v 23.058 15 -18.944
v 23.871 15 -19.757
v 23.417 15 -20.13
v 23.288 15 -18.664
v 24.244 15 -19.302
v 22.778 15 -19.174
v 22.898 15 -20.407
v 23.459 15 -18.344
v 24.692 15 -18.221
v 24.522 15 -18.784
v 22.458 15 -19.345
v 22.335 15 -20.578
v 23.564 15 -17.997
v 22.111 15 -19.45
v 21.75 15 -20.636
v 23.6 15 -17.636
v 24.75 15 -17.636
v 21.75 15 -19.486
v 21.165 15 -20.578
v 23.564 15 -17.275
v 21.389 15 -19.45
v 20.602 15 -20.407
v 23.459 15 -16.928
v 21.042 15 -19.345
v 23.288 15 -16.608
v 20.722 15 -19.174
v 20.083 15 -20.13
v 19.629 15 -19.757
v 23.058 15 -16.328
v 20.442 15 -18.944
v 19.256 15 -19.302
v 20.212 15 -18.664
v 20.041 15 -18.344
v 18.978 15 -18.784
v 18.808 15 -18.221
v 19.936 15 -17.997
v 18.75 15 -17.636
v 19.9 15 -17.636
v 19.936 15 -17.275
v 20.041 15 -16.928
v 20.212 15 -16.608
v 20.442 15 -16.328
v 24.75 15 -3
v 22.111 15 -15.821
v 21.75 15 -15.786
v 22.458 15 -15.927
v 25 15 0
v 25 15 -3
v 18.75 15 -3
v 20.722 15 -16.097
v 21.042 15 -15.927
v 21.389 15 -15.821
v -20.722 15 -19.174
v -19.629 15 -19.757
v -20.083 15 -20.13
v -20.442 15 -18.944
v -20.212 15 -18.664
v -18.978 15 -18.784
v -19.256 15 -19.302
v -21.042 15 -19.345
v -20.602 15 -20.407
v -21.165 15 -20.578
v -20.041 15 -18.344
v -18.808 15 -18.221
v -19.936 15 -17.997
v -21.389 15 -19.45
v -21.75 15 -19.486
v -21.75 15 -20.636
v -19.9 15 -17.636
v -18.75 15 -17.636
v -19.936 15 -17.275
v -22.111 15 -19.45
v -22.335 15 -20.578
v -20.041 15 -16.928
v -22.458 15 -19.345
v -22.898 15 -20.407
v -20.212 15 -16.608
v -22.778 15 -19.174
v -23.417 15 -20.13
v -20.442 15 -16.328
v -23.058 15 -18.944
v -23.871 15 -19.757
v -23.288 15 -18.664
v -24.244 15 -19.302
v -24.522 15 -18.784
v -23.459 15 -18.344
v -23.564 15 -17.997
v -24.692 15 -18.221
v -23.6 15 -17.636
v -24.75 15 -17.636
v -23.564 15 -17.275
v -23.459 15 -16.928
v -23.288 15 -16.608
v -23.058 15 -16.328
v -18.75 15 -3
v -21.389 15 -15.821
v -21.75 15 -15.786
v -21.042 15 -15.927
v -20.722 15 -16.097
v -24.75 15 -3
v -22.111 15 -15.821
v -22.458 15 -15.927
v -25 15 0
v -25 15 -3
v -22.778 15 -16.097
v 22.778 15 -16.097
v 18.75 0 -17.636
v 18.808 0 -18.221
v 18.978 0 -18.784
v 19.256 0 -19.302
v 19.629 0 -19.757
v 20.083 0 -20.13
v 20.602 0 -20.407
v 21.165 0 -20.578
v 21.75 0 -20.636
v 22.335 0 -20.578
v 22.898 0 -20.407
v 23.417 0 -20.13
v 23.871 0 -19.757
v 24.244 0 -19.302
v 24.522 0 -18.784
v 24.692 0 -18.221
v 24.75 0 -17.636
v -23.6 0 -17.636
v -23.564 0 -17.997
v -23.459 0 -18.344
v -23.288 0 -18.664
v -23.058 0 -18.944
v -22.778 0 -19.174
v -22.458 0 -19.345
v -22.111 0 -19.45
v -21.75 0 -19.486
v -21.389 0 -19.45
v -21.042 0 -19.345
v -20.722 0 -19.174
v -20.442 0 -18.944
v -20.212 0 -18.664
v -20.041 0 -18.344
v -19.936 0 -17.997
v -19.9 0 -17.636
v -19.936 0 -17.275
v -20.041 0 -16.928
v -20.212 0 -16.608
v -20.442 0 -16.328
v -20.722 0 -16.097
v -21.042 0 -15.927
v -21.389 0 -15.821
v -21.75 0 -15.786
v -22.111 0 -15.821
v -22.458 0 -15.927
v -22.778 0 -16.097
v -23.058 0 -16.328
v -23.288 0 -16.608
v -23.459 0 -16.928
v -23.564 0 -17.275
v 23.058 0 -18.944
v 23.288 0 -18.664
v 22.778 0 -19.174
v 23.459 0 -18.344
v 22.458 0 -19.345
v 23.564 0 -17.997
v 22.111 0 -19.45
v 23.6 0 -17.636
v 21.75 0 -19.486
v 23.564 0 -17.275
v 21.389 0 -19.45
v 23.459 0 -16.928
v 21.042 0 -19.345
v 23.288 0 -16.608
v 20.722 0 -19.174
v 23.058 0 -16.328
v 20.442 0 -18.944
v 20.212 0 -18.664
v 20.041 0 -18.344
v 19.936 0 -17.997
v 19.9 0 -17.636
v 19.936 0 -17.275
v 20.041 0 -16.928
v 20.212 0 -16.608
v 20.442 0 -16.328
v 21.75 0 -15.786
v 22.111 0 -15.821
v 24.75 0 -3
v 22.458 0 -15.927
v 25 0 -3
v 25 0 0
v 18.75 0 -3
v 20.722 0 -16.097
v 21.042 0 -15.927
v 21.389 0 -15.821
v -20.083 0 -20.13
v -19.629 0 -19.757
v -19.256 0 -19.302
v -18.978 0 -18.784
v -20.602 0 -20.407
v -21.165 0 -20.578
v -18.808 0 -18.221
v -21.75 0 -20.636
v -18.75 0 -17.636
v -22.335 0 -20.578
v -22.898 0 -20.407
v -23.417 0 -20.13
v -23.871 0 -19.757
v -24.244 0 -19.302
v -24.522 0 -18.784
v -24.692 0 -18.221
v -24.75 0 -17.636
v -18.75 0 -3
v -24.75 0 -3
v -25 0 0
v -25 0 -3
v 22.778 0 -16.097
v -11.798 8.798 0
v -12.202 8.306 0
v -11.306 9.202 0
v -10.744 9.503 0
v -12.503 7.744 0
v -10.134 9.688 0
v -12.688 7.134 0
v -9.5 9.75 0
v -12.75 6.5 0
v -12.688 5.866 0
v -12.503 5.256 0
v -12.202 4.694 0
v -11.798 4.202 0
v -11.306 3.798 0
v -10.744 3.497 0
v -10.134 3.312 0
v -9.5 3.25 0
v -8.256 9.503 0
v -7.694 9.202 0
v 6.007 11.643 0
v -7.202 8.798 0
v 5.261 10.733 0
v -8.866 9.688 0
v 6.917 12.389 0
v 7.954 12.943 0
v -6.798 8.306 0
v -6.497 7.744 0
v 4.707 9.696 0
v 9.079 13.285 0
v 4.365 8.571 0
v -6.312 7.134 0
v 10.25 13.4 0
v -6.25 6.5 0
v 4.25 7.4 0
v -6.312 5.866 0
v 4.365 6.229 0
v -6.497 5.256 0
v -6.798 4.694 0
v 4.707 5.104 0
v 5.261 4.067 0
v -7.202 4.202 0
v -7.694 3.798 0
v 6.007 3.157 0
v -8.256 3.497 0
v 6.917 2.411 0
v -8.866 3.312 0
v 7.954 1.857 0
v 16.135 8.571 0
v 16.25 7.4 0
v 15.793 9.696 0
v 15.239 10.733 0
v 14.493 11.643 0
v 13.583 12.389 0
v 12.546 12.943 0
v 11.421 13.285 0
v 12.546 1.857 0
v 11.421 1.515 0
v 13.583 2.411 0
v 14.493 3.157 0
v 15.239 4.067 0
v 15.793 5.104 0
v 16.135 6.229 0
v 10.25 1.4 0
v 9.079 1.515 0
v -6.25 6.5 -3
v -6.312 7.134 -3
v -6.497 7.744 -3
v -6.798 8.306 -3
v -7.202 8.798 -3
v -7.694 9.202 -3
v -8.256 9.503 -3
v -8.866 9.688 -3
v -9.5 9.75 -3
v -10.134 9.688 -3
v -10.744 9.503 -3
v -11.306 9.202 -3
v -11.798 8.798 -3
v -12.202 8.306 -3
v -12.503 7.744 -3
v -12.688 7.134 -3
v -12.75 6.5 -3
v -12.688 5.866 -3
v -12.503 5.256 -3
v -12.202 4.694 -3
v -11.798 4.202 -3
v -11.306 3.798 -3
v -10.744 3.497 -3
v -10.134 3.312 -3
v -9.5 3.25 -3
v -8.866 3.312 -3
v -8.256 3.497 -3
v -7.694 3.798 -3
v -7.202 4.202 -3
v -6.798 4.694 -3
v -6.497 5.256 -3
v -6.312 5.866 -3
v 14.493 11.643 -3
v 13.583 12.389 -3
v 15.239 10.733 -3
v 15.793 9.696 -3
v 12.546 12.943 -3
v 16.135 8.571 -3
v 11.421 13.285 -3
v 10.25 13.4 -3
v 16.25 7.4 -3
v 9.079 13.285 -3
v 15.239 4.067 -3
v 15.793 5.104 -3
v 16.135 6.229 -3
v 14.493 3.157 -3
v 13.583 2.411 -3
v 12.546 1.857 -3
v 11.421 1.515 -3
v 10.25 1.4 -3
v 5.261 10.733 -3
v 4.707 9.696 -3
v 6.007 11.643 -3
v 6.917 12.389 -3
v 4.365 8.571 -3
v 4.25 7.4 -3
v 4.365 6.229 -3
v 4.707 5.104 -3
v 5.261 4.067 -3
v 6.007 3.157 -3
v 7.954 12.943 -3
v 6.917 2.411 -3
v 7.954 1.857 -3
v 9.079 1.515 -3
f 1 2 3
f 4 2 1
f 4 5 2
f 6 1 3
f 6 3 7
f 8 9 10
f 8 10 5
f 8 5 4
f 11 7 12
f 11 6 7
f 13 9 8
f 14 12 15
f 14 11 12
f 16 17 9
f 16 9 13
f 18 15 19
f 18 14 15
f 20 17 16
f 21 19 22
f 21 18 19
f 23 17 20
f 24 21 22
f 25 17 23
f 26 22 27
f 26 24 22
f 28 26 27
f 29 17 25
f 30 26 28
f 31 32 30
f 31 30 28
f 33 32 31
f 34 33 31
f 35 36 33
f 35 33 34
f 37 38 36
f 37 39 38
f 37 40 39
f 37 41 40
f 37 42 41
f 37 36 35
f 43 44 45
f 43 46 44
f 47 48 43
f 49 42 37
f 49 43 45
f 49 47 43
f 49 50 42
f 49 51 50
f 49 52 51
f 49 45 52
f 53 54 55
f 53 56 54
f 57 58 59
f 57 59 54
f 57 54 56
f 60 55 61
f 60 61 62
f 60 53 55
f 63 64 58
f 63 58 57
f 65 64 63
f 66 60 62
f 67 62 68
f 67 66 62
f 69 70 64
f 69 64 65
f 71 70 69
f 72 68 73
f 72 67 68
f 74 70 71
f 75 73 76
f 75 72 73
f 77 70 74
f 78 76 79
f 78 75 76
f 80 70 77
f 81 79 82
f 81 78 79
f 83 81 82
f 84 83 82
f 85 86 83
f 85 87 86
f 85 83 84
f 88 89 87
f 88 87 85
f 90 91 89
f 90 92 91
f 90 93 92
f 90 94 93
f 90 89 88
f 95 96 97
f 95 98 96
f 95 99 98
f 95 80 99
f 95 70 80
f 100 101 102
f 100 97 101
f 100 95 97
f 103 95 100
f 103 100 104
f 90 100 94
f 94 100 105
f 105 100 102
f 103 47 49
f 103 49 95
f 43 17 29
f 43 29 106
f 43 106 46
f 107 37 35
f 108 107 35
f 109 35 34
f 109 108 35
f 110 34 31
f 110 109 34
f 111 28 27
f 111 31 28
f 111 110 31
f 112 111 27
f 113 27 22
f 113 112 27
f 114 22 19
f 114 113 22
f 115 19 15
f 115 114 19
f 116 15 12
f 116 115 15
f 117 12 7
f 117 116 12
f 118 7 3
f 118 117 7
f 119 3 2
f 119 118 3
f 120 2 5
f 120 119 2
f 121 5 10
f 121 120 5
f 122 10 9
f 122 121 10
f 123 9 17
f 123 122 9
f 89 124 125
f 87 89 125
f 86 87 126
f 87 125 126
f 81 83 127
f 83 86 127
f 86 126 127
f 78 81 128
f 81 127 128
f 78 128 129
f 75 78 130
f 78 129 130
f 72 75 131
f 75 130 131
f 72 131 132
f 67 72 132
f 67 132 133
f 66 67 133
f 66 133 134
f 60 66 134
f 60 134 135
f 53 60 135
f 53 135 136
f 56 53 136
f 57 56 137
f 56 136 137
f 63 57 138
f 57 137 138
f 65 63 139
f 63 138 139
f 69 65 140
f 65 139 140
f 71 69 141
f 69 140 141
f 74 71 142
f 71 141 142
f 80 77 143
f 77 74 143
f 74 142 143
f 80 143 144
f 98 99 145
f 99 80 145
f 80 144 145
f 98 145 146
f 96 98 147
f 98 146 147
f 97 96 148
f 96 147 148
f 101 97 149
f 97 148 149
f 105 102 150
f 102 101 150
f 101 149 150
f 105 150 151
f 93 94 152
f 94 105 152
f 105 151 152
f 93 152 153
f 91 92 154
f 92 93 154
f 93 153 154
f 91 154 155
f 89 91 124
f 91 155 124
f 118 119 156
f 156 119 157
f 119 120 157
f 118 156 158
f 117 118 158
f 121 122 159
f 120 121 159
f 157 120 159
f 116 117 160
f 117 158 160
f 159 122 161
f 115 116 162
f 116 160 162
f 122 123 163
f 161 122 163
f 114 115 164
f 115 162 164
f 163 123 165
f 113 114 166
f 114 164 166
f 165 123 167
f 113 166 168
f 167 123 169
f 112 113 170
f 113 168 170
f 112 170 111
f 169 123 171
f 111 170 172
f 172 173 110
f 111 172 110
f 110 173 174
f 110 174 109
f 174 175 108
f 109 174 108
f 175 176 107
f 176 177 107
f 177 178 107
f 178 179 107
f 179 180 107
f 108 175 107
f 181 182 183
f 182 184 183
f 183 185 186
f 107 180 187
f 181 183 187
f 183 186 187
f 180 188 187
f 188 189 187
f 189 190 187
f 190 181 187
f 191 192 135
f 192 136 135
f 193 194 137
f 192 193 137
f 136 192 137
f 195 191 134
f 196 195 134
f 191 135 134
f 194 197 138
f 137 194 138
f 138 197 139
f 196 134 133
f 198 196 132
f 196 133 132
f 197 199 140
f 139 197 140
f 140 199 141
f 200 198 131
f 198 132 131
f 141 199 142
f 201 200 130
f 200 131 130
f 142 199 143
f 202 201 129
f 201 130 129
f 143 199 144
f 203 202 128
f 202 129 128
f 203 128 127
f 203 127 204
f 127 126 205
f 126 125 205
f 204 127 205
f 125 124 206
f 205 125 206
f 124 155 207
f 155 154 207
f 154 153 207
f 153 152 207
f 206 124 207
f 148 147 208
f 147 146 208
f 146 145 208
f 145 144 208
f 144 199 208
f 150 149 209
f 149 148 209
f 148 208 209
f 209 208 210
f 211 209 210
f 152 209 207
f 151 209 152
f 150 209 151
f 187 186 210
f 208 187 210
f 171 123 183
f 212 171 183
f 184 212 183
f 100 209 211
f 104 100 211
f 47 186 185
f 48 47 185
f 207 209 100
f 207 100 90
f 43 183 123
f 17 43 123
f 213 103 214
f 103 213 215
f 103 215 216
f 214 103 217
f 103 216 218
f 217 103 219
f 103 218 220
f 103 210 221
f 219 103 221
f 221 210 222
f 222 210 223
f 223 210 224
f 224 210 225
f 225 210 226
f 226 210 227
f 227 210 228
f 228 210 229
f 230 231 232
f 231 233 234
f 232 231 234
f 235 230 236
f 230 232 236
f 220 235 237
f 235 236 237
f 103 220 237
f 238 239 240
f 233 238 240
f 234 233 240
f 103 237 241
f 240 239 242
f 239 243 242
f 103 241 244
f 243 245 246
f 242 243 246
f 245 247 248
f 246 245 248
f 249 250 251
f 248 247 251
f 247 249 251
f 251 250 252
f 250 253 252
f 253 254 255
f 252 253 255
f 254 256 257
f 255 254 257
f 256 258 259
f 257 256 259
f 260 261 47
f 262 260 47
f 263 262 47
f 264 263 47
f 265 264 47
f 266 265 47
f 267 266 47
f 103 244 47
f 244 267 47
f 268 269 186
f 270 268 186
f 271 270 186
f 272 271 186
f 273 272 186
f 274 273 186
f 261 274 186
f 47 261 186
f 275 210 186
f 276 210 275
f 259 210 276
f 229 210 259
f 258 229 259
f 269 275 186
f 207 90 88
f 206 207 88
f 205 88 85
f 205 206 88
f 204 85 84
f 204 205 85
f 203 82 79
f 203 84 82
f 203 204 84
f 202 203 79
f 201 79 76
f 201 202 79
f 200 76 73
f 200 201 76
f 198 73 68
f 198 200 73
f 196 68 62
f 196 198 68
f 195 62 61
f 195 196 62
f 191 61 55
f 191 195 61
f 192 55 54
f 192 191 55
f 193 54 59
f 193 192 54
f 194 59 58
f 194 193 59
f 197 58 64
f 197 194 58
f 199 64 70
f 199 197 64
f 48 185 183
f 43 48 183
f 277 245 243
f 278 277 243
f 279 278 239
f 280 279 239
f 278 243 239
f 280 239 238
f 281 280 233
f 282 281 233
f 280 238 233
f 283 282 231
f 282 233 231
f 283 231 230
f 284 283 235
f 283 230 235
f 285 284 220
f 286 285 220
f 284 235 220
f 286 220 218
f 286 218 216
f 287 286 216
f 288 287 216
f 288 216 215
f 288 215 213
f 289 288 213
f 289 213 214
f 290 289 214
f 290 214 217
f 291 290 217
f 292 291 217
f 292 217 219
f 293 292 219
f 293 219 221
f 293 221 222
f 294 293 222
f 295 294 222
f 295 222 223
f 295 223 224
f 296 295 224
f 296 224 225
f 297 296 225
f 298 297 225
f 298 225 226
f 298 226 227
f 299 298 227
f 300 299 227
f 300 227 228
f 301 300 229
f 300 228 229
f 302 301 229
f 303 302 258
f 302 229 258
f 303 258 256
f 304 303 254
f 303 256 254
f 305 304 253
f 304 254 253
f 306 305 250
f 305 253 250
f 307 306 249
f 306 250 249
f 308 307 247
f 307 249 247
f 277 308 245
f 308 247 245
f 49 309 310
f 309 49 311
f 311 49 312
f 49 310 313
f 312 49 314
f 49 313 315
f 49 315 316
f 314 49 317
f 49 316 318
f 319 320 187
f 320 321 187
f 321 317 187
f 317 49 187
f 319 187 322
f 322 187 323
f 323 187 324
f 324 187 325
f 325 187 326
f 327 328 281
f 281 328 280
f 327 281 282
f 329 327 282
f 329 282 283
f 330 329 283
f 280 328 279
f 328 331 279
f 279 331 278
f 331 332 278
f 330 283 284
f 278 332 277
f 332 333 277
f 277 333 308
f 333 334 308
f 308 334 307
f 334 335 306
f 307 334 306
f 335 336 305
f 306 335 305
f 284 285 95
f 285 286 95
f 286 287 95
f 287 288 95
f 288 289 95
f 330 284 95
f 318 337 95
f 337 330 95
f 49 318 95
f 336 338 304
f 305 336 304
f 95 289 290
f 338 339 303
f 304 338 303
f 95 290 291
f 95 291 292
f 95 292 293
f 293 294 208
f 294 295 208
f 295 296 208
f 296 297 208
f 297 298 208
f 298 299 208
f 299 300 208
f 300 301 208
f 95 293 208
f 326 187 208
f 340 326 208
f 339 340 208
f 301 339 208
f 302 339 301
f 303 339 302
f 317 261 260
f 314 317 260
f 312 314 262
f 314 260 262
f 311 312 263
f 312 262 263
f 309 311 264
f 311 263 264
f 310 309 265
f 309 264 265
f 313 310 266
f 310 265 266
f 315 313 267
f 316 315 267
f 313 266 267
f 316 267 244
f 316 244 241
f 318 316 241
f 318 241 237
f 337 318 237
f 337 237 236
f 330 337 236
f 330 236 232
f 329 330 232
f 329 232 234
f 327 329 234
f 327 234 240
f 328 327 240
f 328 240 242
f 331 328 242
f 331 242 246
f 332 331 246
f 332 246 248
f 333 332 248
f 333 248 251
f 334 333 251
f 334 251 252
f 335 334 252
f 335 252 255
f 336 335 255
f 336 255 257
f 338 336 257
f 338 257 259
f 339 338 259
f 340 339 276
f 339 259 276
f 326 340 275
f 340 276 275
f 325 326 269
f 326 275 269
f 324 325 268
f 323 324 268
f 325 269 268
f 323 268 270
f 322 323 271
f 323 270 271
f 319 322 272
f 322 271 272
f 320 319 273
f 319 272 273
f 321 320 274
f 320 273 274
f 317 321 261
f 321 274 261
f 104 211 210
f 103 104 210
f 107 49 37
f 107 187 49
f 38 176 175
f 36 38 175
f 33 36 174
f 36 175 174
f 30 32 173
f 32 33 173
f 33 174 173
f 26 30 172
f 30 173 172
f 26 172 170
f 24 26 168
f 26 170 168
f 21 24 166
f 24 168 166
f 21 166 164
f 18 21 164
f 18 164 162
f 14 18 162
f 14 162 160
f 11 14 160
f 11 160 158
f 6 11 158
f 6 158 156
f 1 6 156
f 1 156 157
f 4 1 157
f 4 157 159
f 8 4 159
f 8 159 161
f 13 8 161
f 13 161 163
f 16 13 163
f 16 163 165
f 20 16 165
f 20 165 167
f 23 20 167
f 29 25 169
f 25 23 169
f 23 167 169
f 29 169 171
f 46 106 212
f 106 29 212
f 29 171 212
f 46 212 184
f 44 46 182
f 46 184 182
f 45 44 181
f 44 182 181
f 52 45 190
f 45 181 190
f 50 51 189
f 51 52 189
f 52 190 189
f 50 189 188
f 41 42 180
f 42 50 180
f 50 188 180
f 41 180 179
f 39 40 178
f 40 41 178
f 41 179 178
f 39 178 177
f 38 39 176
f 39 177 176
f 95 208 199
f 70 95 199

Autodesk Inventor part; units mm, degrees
ref_plane "YZ Plane" through (0, 0, 0) normal (1, 0, 0) x (0, 1, 0)
ref_plane "XZ Plane" through (0, 0, 0) normal (0, 1, 0) x (-1, 0, 0)
ref_plane "XY Plane" through (0, 0, 0) normal (0, 0, 1) x (1, 0, 0)
sketch "Sketch1" plane through (0, 0, 0) normal (0, 1, 0) x (-1, 0, 0)
  line L0 (25, 0) -> (-25, 0)
  line L1 (-25, 0) -> (-25, -3)
  line L2 (-25, -3) -> (25, -3)
  line L3 (25, -3) -> (25, 0)
  line L4 (0, 0) -> (0, -12.1399) construction
  line L5 (24.75, -3) -> (24.75, -17.6357)
  line L6 (18.75, -3) -> (18.75, -17.6357)
  arc A0 (18.75, -17.6357) -> (24.75, -17.6357) centre (21.75, -17.6357) ccw
  circle A1 centre (21.75, -17.6357) radius 1.85
  line L7 (-24.75, -3) -> (-24.75, -17.6357)
  line L8 (-18.75, -3) -> (-18.75, -17.6357)
  arc A2 (-24.75, -17.6357) -> (-18.75, -17.6357) centre (-21.75, -17.6357) ccw
  circle A3 centre (-21.75, -17.6357) radius 1.85
  line L9 (-24.75, -3) -> (-18.75, -3)
  dimension "d0" = 3
  dimension "d1" = 50
  dimension "d2" = 43.5
  dimension "d3" = 14.6357
  dimension "d4" = 3.7
  dimension "d5" = 3
extrude "Extrusion1" add sketch "Sketch1" along normal blind 15
sketch "Sketch2" plane through (-25, 0, 0) normal (0, 0, 1) x (1, 0, 0)
  line L0 (0, 0) -> (50, 0) projected
  line L1 (50, 0) -> (50, 15) projected
  line L2 (0, 15) -> (50, 15) projected
  line L3 (0, 0) -> (0, 15) projected
  circle A0 centre (15.5, 6.5) radius 3.25
  circle A1 centre (35.25, 7.4) radius 6
  line L4 (43.75, 0) -> (43.75, 15) projected
  point P0 (25, 0)
  point P1 (25, 0)
  point P2 (50, 7.5)
  point P3 (0, 7.5)
  dimension "d8" = 6.5
  dimension "d14" = 34.5
  dimension "d15" = 8.5
  dimension "d16" = 12
  dimension "d17" = 8.5
  dimension "d21" = 15
  dimension "d22" = 7.4
extrude "Extrusion2" cut sketch "Sketch2" against normal through all contours A0
sketch "Sketch3" plane through (0, 0, 0) normal (0, -1, 0) x (1, 0, 0)
  point P0 (0, 0)
extrude "Extrusion3" cut sketch "Sketch2" against normal through all contours A1
properties part number "portaswitch" material "Default New Material(1)"
